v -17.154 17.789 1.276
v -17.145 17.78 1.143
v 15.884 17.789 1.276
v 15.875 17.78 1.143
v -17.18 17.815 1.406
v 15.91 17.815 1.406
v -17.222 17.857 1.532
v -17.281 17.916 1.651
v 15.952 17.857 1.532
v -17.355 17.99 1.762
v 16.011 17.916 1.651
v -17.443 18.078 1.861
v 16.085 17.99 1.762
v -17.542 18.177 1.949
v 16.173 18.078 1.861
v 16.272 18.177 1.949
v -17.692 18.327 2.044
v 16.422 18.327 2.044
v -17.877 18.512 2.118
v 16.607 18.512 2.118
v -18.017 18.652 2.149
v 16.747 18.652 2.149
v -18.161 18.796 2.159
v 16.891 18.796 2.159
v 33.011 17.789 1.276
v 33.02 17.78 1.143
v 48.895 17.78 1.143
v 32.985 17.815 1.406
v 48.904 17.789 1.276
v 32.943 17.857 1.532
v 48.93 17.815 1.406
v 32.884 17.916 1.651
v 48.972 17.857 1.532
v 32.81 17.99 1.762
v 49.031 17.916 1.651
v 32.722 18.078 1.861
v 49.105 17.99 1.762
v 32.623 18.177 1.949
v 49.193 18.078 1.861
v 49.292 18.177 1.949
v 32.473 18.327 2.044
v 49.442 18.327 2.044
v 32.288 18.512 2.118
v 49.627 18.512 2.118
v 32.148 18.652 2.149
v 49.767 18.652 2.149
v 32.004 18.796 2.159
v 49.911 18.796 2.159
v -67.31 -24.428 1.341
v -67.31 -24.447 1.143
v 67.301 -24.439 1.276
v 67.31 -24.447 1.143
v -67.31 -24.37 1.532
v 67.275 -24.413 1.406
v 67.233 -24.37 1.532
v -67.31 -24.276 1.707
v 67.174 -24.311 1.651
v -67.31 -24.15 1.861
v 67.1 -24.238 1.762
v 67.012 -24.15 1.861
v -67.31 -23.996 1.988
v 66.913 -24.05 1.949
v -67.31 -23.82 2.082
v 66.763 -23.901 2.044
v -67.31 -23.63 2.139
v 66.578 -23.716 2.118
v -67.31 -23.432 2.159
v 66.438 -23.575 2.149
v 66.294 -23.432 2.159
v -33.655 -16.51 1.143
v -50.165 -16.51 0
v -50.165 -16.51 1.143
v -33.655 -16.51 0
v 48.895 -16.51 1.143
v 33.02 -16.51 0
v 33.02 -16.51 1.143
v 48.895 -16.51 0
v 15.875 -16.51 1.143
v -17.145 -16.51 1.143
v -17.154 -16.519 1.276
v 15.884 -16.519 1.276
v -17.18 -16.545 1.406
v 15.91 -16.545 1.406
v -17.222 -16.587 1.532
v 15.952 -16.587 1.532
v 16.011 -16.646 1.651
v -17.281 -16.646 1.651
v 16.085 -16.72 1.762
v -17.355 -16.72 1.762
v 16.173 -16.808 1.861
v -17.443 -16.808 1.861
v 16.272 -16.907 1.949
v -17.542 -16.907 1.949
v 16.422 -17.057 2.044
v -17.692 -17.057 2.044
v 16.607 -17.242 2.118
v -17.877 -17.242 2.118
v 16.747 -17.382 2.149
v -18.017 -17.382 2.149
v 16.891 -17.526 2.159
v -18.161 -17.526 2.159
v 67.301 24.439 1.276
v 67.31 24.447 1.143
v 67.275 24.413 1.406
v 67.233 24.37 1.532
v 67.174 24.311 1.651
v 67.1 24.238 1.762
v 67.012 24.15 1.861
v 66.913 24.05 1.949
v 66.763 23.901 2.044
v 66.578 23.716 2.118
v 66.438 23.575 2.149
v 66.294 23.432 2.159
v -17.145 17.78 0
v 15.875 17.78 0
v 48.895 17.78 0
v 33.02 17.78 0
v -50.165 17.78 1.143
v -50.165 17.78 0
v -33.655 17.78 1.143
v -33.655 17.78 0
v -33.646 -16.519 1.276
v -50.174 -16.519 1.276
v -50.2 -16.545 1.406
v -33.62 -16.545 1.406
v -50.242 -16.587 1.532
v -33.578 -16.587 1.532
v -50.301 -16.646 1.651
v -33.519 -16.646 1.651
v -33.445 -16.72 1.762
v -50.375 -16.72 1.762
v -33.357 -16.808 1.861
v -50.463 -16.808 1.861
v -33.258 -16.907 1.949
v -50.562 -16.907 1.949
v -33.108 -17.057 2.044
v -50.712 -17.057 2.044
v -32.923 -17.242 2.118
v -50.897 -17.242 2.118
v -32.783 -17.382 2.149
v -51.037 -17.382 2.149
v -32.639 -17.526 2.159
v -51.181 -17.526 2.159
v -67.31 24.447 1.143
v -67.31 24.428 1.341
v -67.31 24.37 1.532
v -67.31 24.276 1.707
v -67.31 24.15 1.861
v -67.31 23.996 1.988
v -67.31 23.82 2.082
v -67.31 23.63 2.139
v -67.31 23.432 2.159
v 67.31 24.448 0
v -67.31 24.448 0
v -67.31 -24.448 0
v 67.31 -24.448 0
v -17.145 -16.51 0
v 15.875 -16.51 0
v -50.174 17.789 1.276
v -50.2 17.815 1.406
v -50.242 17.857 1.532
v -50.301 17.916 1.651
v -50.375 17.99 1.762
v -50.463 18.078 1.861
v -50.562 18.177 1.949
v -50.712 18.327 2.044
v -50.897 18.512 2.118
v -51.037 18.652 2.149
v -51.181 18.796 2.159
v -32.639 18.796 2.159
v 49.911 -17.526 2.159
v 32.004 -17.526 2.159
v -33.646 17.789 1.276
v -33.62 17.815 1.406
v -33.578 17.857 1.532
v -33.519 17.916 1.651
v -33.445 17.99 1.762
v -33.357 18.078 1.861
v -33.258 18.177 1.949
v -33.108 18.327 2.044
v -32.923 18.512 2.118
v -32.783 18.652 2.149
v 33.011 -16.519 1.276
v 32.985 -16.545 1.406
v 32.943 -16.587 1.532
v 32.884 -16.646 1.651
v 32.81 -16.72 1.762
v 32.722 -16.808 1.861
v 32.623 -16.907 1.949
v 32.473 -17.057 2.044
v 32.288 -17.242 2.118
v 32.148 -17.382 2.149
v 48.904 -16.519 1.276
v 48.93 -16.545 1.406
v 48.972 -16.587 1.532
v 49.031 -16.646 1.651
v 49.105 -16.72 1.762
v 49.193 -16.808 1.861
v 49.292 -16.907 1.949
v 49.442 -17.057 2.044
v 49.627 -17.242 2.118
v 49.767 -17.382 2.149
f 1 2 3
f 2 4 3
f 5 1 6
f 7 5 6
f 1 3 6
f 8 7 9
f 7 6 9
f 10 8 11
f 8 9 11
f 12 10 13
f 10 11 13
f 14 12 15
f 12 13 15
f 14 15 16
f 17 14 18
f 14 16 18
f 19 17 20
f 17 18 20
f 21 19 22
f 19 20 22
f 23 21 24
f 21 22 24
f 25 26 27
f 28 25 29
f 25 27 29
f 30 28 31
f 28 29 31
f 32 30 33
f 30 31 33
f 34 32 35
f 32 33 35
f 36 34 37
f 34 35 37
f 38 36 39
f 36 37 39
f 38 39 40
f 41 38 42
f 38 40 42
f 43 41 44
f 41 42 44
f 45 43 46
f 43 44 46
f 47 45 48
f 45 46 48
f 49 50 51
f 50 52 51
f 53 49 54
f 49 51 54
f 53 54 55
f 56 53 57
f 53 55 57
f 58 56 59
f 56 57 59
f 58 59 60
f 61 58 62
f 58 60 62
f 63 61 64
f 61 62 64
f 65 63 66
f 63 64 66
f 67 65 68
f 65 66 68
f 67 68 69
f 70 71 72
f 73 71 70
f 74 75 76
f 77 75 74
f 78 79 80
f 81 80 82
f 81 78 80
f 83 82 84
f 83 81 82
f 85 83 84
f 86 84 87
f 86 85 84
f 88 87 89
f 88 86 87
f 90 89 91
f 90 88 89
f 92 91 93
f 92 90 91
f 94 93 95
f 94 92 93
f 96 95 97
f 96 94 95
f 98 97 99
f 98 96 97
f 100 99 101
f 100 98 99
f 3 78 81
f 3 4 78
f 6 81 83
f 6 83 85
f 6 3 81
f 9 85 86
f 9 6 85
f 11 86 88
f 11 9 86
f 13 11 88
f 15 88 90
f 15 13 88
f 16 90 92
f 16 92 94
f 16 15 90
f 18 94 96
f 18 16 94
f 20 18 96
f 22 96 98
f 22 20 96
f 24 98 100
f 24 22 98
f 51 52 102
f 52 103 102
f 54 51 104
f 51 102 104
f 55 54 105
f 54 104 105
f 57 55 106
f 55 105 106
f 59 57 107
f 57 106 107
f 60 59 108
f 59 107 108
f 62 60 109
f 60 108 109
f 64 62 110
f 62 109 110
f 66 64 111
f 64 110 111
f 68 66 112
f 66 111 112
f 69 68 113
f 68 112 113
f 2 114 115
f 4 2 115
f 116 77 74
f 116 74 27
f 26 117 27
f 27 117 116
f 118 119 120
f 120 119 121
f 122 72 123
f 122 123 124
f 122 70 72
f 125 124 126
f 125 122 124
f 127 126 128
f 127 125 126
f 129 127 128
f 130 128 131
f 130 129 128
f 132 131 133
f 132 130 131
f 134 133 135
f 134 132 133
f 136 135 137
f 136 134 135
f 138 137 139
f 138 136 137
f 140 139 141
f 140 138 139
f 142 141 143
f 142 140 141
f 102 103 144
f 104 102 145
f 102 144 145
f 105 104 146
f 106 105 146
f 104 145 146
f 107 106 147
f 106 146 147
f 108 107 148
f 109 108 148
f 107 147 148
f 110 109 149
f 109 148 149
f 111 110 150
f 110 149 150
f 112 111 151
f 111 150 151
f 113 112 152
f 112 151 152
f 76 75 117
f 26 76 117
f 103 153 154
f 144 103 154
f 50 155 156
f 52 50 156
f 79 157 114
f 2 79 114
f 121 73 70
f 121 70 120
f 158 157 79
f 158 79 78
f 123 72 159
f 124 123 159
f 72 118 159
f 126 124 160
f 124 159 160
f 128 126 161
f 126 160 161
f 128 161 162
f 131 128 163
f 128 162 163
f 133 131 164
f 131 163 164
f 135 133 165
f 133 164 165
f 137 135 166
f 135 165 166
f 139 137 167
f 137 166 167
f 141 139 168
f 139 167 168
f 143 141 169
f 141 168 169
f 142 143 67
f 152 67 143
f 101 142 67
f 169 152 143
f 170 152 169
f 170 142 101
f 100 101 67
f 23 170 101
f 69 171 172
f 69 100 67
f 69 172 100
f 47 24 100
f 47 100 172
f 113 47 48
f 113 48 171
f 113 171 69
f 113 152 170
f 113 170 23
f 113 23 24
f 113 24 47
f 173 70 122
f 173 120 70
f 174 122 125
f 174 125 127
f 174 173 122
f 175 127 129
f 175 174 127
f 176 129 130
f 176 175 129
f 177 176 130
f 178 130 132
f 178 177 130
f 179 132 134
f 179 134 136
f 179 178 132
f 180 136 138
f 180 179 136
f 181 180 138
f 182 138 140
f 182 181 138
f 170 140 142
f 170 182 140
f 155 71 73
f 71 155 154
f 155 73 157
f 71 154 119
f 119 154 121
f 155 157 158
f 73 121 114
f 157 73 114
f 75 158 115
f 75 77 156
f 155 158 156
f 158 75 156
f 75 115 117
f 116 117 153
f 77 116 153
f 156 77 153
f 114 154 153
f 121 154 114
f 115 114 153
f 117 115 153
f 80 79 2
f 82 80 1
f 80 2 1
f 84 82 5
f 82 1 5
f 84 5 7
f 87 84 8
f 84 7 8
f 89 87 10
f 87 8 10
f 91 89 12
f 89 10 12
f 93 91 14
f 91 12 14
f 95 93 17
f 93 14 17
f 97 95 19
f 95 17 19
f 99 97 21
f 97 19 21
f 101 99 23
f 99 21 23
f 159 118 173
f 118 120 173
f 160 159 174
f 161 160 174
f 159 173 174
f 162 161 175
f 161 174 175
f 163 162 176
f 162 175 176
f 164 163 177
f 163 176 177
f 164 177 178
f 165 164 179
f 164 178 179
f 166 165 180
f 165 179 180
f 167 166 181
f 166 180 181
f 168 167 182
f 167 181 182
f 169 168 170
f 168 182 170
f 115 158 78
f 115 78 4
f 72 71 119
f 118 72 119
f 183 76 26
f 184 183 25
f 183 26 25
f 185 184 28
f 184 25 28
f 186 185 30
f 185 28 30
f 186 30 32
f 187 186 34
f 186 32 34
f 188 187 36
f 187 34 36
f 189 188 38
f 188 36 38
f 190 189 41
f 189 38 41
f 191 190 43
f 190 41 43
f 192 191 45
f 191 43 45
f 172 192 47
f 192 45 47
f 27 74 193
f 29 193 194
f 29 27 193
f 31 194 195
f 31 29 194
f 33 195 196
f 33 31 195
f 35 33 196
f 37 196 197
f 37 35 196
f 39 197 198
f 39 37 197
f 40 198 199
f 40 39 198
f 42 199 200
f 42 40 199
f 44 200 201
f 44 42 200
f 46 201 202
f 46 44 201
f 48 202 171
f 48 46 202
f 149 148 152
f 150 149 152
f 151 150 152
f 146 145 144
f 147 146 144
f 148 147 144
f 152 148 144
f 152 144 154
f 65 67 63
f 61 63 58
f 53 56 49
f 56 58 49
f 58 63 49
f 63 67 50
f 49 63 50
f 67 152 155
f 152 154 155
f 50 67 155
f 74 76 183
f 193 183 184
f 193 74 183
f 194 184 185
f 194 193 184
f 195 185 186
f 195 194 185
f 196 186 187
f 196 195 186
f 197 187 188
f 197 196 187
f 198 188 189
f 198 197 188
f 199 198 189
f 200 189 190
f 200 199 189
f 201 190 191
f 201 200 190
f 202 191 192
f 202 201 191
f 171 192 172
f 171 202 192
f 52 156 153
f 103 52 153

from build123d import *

# Parameters (mm, degrees)
F0_W     = 16.51
F0_H     = 34.29
F0_W_2   = 33.02
F0_W_3   = 15.875
F1_DEPTH = 2.159
F2_R     = 1.016


with BuildPart() as f1:
    # F0 (on Top) → F1 (new body)
    with BuildSketch(Plane.XY):
        Polygon((-67.31, -10.4775), (-67.31, -24.4475), (-33.655, -24.4475), (0, -24.4475), (33.02, -24.4475), (67.31, -24.4475), (67.31, 0), (67.31, 24.4475), (33.02, 24.4475), (0, 24.4475), (-33.655, 24.4475), (-67.31, 24.4475), (-67.31, 10.4775), align=None)
        with Locations((-41.91, 0.635)):
            Rectangle(F0_W, F0_H, mode=Mode.SUBTRACT)
        with Locations((-0.635, 0.635)):
            Rectangle(F0_W_2, F0_H, mode=Mode.SUBTRACT)
        with Locations((40.9575, 0.635)):
            Rectangle(F0_W_3, F0_H, mode=Mode.SUBTRACT)
    extrude(amount=F1_DEPTH)

    # F2
    f2_edges = [f1.edges().sort_by_distance(p)[0] for p in [
        (15.875, 0.635, 2.159),
        (-33.655, 0.635, 2.159),
        (-17.145, 0.635, 2.159),
        (-50.165, 0.635, 2.159),
        (-41.91, 17.78, 2.159),
        (-0.635, 17.78, 2.159),
        (-0.635, -16.51, 2.159),
        (-41.91, -16.51, 2.159),
        (40.9575, -16.51, 2.159),
        (33.02, 0.635, 2.159),
        (40.9575, 17.78, 2.159),
        (48.895, 0.635, 2.159),
        (0, -24.4475, 2.159),
        (0, 24.4475, 2.159),
        (67.31, 0, 2.159),
    ]]
    fillet(f2_edges, radius=F2_R)


solid = f1.part
